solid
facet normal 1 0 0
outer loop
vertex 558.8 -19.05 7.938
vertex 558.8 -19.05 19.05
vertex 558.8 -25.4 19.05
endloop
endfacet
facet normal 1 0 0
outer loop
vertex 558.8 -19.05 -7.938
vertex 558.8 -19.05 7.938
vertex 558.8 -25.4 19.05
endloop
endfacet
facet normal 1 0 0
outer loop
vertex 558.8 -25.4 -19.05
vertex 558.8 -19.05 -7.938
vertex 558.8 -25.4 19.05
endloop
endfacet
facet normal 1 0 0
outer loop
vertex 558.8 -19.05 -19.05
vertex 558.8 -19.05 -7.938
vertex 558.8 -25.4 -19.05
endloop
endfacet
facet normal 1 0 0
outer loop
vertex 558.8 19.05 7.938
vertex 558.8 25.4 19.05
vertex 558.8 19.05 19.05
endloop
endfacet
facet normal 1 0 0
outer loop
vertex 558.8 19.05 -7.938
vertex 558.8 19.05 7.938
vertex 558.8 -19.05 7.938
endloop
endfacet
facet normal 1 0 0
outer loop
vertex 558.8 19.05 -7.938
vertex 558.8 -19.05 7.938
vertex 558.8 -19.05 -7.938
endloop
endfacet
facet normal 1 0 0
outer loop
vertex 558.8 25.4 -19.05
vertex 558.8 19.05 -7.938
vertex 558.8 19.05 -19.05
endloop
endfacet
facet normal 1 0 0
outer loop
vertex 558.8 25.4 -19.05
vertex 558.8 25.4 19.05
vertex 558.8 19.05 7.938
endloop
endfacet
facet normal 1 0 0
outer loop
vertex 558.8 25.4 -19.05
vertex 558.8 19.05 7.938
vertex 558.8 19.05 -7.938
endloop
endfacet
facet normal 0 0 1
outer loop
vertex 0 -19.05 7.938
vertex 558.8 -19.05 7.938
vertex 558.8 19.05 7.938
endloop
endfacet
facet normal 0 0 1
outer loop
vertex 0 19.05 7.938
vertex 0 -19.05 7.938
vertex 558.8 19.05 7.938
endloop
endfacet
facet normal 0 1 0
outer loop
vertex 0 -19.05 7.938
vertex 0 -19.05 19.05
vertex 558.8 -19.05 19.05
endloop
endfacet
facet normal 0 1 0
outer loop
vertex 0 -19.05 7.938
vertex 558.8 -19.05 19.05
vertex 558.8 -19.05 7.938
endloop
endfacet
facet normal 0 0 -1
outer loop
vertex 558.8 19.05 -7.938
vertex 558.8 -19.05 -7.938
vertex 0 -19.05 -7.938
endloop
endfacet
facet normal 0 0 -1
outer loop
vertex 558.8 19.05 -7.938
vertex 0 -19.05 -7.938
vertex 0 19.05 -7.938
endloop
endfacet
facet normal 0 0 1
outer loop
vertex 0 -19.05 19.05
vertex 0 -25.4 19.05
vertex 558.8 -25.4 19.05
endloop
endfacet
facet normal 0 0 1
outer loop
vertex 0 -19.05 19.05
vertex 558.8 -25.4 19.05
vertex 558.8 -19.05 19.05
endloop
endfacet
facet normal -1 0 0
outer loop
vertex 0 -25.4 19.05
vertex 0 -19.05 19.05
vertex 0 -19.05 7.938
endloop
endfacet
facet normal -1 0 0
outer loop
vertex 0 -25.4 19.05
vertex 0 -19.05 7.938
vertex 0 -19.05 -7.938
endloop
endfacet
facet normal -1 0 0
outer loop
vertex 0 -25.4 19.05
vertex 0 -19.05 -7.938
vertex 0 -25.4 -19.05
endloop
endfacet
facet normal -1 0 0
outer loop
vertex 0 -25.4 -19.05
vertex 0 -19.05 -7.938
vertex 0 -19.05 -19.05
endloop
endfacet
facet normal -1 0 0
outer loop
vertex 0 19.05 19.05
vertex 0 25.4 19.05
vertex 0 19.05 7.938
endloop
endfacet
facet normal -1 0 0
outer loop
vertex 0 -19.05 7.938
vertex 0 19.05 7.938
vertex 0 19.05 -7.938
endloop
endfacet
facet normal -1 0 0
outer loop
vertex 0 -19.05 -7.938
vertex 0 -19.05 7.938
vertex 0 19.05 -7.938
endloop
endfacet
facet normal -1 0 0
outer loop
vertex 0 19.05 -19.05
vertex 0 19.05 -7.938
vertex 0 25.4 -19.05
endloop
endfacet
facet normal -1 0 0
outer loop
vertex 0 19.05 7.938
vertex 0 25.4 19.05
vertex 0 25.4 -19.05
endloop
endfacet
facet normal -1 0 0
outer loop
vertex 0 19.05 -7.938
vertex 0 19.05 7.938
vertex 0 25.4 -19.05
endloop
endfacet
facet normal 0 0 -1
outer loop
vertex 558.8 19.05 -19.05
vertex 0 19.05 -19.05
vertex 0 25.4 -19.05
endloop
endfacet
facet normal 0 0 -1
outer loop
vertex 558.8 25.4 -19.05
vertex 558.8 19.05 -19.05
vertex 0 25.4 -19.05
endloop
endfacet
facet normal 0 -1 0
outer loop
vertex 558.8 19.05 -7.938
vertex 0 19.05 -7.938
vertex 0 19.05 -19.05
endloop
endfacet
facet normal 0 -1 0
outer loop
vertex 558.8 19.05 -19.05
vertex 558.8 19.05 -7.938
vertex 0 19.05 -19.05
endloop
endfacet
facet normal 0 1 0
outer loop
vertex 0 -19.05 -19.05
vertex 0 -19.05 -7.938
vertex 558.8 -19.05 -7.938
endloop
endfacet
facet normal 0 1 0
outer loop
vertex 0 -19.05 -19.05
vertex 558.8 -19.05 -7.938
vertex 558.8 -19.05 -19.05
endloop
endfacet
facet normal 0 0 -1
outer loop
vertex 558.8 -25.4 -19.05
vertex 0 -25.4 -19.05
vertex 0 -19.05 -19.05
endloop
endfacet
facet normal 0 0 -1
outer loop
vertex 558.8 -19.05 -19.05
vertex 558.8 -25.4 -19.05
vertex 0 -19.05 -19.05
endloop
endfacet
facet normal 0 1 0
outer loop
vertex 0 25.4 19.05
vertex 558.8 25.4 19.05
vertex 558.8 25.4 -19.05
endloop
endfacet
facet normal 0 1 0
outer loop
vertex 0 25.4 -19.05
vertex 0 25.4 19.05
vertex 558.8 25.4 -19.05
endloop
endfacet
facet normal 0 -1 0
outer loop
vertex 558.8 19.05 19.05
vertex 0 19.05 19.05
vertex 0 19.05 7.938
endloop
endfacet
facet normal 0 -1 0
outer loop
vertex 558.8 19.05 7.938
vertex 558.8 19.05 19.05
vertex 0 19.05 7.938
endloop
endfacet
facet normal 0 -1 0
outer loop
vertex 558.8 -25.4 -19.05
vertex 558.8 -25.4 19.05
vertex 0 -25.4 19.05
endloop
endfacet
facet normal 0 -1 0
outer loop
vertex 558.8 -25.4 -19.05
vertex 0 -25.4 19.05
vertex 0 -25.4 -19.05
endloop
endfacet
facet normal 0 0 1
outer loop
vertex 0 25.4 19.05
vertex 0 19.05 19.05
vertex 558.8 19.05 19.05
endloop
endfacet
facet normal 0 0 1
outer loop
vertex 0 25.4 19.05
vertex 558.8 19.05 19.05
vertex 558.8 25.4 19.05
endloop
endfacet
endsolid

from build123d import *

# Parameters (mm, degrees)
SKETCH2_W           = 38.1
SKETCH2_H           = 6.35
SKETCH2_W_2         = 15.875
SKETCH2_H_2         = 38.1
BOSS_EXTRUDE1_DEPTH = 558.8


with BuildPart() as part:
    # Sketch2 → Boss-Extrude1 (new body)
    with BuildSketch(Plane(origin=(0, 0, 0), x_dir=(0, 0, -1), z_dir=(1, 0, 0))):
        with Locations((0, 22.225)):
            Rectangle(SKETCH2_W, SKETCH2_H)
        Rectangle(SKETCH2_W_2, SKETCH2_H_2)
        with Locations((0, -22.225)):
            Rectangle(SKETCH2_W, SKETCH2_H)
    extrude(amount=BOSS_EXTRUDE1_DEPTH)


solid = part.part
